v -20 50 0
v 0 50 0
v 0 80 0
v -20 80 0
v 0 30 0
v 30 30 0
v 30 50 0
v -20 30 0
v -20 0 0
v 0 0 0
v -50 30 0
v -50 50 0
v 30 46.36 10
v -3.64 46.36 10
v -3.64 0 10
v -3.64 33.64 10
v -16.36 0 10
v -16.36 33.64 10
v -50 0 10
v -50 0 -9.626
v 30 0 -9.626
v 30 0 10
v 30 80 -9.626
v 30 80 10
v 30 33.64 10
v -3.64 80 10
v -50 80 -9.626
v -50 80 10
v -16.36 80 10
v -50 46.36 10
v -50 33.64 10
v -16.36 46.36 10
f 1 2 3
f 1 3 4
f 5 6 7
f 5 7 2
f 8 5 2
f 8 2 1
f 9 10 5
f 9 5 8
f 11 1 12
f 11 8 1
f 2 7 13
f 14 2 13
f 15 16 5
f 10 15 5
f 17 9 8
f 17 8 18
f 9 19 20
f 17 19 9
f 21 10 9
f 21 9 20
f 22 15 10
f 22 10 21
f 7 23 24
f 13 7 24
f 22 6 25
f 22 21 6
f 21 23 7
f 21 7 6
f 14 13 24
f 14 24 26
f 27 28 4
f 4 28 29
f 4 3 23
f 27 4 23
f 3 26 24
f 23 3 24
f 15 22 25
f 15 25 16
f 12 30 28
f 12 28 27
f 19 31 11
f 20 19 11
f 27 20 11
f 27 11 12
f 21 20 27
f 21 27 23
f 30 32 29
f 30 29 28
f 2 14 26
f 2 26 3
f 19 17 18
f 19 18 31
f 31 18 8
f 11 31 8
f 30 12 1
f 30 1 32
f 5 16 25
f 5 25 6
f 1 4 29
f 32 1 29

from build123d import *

# Parameters (mm, degrees)
F1_DEPTH = 80
F3_DEPTH = 80


with BuildPart() as f1:
    # F0 (on Front) → F1 (new body)
    with BuildSketch(Plane.XZ):
        Polygon((-3.64, 10), (0, 0), (-20, 0), (-16.36, 10), (-20, 10), (-50, 10), (-50, -9.62604), (-10, -9.62604), (30, -9.62604), (30, 10), (0, 10), align=None)
    extrude(amount=-F1_DEPTH)

    # F2 (on face) → F3 (cut)
    with BuildSketch(Plane.YZ.offset(30)):
        Polygon((33.64, 10), (30, 0), (50, 0), (46.36, 10), align=None)
    extrude(amount=-F3_DEPTH, mode=Mode.SUBTRACT)


solid = f1.part
